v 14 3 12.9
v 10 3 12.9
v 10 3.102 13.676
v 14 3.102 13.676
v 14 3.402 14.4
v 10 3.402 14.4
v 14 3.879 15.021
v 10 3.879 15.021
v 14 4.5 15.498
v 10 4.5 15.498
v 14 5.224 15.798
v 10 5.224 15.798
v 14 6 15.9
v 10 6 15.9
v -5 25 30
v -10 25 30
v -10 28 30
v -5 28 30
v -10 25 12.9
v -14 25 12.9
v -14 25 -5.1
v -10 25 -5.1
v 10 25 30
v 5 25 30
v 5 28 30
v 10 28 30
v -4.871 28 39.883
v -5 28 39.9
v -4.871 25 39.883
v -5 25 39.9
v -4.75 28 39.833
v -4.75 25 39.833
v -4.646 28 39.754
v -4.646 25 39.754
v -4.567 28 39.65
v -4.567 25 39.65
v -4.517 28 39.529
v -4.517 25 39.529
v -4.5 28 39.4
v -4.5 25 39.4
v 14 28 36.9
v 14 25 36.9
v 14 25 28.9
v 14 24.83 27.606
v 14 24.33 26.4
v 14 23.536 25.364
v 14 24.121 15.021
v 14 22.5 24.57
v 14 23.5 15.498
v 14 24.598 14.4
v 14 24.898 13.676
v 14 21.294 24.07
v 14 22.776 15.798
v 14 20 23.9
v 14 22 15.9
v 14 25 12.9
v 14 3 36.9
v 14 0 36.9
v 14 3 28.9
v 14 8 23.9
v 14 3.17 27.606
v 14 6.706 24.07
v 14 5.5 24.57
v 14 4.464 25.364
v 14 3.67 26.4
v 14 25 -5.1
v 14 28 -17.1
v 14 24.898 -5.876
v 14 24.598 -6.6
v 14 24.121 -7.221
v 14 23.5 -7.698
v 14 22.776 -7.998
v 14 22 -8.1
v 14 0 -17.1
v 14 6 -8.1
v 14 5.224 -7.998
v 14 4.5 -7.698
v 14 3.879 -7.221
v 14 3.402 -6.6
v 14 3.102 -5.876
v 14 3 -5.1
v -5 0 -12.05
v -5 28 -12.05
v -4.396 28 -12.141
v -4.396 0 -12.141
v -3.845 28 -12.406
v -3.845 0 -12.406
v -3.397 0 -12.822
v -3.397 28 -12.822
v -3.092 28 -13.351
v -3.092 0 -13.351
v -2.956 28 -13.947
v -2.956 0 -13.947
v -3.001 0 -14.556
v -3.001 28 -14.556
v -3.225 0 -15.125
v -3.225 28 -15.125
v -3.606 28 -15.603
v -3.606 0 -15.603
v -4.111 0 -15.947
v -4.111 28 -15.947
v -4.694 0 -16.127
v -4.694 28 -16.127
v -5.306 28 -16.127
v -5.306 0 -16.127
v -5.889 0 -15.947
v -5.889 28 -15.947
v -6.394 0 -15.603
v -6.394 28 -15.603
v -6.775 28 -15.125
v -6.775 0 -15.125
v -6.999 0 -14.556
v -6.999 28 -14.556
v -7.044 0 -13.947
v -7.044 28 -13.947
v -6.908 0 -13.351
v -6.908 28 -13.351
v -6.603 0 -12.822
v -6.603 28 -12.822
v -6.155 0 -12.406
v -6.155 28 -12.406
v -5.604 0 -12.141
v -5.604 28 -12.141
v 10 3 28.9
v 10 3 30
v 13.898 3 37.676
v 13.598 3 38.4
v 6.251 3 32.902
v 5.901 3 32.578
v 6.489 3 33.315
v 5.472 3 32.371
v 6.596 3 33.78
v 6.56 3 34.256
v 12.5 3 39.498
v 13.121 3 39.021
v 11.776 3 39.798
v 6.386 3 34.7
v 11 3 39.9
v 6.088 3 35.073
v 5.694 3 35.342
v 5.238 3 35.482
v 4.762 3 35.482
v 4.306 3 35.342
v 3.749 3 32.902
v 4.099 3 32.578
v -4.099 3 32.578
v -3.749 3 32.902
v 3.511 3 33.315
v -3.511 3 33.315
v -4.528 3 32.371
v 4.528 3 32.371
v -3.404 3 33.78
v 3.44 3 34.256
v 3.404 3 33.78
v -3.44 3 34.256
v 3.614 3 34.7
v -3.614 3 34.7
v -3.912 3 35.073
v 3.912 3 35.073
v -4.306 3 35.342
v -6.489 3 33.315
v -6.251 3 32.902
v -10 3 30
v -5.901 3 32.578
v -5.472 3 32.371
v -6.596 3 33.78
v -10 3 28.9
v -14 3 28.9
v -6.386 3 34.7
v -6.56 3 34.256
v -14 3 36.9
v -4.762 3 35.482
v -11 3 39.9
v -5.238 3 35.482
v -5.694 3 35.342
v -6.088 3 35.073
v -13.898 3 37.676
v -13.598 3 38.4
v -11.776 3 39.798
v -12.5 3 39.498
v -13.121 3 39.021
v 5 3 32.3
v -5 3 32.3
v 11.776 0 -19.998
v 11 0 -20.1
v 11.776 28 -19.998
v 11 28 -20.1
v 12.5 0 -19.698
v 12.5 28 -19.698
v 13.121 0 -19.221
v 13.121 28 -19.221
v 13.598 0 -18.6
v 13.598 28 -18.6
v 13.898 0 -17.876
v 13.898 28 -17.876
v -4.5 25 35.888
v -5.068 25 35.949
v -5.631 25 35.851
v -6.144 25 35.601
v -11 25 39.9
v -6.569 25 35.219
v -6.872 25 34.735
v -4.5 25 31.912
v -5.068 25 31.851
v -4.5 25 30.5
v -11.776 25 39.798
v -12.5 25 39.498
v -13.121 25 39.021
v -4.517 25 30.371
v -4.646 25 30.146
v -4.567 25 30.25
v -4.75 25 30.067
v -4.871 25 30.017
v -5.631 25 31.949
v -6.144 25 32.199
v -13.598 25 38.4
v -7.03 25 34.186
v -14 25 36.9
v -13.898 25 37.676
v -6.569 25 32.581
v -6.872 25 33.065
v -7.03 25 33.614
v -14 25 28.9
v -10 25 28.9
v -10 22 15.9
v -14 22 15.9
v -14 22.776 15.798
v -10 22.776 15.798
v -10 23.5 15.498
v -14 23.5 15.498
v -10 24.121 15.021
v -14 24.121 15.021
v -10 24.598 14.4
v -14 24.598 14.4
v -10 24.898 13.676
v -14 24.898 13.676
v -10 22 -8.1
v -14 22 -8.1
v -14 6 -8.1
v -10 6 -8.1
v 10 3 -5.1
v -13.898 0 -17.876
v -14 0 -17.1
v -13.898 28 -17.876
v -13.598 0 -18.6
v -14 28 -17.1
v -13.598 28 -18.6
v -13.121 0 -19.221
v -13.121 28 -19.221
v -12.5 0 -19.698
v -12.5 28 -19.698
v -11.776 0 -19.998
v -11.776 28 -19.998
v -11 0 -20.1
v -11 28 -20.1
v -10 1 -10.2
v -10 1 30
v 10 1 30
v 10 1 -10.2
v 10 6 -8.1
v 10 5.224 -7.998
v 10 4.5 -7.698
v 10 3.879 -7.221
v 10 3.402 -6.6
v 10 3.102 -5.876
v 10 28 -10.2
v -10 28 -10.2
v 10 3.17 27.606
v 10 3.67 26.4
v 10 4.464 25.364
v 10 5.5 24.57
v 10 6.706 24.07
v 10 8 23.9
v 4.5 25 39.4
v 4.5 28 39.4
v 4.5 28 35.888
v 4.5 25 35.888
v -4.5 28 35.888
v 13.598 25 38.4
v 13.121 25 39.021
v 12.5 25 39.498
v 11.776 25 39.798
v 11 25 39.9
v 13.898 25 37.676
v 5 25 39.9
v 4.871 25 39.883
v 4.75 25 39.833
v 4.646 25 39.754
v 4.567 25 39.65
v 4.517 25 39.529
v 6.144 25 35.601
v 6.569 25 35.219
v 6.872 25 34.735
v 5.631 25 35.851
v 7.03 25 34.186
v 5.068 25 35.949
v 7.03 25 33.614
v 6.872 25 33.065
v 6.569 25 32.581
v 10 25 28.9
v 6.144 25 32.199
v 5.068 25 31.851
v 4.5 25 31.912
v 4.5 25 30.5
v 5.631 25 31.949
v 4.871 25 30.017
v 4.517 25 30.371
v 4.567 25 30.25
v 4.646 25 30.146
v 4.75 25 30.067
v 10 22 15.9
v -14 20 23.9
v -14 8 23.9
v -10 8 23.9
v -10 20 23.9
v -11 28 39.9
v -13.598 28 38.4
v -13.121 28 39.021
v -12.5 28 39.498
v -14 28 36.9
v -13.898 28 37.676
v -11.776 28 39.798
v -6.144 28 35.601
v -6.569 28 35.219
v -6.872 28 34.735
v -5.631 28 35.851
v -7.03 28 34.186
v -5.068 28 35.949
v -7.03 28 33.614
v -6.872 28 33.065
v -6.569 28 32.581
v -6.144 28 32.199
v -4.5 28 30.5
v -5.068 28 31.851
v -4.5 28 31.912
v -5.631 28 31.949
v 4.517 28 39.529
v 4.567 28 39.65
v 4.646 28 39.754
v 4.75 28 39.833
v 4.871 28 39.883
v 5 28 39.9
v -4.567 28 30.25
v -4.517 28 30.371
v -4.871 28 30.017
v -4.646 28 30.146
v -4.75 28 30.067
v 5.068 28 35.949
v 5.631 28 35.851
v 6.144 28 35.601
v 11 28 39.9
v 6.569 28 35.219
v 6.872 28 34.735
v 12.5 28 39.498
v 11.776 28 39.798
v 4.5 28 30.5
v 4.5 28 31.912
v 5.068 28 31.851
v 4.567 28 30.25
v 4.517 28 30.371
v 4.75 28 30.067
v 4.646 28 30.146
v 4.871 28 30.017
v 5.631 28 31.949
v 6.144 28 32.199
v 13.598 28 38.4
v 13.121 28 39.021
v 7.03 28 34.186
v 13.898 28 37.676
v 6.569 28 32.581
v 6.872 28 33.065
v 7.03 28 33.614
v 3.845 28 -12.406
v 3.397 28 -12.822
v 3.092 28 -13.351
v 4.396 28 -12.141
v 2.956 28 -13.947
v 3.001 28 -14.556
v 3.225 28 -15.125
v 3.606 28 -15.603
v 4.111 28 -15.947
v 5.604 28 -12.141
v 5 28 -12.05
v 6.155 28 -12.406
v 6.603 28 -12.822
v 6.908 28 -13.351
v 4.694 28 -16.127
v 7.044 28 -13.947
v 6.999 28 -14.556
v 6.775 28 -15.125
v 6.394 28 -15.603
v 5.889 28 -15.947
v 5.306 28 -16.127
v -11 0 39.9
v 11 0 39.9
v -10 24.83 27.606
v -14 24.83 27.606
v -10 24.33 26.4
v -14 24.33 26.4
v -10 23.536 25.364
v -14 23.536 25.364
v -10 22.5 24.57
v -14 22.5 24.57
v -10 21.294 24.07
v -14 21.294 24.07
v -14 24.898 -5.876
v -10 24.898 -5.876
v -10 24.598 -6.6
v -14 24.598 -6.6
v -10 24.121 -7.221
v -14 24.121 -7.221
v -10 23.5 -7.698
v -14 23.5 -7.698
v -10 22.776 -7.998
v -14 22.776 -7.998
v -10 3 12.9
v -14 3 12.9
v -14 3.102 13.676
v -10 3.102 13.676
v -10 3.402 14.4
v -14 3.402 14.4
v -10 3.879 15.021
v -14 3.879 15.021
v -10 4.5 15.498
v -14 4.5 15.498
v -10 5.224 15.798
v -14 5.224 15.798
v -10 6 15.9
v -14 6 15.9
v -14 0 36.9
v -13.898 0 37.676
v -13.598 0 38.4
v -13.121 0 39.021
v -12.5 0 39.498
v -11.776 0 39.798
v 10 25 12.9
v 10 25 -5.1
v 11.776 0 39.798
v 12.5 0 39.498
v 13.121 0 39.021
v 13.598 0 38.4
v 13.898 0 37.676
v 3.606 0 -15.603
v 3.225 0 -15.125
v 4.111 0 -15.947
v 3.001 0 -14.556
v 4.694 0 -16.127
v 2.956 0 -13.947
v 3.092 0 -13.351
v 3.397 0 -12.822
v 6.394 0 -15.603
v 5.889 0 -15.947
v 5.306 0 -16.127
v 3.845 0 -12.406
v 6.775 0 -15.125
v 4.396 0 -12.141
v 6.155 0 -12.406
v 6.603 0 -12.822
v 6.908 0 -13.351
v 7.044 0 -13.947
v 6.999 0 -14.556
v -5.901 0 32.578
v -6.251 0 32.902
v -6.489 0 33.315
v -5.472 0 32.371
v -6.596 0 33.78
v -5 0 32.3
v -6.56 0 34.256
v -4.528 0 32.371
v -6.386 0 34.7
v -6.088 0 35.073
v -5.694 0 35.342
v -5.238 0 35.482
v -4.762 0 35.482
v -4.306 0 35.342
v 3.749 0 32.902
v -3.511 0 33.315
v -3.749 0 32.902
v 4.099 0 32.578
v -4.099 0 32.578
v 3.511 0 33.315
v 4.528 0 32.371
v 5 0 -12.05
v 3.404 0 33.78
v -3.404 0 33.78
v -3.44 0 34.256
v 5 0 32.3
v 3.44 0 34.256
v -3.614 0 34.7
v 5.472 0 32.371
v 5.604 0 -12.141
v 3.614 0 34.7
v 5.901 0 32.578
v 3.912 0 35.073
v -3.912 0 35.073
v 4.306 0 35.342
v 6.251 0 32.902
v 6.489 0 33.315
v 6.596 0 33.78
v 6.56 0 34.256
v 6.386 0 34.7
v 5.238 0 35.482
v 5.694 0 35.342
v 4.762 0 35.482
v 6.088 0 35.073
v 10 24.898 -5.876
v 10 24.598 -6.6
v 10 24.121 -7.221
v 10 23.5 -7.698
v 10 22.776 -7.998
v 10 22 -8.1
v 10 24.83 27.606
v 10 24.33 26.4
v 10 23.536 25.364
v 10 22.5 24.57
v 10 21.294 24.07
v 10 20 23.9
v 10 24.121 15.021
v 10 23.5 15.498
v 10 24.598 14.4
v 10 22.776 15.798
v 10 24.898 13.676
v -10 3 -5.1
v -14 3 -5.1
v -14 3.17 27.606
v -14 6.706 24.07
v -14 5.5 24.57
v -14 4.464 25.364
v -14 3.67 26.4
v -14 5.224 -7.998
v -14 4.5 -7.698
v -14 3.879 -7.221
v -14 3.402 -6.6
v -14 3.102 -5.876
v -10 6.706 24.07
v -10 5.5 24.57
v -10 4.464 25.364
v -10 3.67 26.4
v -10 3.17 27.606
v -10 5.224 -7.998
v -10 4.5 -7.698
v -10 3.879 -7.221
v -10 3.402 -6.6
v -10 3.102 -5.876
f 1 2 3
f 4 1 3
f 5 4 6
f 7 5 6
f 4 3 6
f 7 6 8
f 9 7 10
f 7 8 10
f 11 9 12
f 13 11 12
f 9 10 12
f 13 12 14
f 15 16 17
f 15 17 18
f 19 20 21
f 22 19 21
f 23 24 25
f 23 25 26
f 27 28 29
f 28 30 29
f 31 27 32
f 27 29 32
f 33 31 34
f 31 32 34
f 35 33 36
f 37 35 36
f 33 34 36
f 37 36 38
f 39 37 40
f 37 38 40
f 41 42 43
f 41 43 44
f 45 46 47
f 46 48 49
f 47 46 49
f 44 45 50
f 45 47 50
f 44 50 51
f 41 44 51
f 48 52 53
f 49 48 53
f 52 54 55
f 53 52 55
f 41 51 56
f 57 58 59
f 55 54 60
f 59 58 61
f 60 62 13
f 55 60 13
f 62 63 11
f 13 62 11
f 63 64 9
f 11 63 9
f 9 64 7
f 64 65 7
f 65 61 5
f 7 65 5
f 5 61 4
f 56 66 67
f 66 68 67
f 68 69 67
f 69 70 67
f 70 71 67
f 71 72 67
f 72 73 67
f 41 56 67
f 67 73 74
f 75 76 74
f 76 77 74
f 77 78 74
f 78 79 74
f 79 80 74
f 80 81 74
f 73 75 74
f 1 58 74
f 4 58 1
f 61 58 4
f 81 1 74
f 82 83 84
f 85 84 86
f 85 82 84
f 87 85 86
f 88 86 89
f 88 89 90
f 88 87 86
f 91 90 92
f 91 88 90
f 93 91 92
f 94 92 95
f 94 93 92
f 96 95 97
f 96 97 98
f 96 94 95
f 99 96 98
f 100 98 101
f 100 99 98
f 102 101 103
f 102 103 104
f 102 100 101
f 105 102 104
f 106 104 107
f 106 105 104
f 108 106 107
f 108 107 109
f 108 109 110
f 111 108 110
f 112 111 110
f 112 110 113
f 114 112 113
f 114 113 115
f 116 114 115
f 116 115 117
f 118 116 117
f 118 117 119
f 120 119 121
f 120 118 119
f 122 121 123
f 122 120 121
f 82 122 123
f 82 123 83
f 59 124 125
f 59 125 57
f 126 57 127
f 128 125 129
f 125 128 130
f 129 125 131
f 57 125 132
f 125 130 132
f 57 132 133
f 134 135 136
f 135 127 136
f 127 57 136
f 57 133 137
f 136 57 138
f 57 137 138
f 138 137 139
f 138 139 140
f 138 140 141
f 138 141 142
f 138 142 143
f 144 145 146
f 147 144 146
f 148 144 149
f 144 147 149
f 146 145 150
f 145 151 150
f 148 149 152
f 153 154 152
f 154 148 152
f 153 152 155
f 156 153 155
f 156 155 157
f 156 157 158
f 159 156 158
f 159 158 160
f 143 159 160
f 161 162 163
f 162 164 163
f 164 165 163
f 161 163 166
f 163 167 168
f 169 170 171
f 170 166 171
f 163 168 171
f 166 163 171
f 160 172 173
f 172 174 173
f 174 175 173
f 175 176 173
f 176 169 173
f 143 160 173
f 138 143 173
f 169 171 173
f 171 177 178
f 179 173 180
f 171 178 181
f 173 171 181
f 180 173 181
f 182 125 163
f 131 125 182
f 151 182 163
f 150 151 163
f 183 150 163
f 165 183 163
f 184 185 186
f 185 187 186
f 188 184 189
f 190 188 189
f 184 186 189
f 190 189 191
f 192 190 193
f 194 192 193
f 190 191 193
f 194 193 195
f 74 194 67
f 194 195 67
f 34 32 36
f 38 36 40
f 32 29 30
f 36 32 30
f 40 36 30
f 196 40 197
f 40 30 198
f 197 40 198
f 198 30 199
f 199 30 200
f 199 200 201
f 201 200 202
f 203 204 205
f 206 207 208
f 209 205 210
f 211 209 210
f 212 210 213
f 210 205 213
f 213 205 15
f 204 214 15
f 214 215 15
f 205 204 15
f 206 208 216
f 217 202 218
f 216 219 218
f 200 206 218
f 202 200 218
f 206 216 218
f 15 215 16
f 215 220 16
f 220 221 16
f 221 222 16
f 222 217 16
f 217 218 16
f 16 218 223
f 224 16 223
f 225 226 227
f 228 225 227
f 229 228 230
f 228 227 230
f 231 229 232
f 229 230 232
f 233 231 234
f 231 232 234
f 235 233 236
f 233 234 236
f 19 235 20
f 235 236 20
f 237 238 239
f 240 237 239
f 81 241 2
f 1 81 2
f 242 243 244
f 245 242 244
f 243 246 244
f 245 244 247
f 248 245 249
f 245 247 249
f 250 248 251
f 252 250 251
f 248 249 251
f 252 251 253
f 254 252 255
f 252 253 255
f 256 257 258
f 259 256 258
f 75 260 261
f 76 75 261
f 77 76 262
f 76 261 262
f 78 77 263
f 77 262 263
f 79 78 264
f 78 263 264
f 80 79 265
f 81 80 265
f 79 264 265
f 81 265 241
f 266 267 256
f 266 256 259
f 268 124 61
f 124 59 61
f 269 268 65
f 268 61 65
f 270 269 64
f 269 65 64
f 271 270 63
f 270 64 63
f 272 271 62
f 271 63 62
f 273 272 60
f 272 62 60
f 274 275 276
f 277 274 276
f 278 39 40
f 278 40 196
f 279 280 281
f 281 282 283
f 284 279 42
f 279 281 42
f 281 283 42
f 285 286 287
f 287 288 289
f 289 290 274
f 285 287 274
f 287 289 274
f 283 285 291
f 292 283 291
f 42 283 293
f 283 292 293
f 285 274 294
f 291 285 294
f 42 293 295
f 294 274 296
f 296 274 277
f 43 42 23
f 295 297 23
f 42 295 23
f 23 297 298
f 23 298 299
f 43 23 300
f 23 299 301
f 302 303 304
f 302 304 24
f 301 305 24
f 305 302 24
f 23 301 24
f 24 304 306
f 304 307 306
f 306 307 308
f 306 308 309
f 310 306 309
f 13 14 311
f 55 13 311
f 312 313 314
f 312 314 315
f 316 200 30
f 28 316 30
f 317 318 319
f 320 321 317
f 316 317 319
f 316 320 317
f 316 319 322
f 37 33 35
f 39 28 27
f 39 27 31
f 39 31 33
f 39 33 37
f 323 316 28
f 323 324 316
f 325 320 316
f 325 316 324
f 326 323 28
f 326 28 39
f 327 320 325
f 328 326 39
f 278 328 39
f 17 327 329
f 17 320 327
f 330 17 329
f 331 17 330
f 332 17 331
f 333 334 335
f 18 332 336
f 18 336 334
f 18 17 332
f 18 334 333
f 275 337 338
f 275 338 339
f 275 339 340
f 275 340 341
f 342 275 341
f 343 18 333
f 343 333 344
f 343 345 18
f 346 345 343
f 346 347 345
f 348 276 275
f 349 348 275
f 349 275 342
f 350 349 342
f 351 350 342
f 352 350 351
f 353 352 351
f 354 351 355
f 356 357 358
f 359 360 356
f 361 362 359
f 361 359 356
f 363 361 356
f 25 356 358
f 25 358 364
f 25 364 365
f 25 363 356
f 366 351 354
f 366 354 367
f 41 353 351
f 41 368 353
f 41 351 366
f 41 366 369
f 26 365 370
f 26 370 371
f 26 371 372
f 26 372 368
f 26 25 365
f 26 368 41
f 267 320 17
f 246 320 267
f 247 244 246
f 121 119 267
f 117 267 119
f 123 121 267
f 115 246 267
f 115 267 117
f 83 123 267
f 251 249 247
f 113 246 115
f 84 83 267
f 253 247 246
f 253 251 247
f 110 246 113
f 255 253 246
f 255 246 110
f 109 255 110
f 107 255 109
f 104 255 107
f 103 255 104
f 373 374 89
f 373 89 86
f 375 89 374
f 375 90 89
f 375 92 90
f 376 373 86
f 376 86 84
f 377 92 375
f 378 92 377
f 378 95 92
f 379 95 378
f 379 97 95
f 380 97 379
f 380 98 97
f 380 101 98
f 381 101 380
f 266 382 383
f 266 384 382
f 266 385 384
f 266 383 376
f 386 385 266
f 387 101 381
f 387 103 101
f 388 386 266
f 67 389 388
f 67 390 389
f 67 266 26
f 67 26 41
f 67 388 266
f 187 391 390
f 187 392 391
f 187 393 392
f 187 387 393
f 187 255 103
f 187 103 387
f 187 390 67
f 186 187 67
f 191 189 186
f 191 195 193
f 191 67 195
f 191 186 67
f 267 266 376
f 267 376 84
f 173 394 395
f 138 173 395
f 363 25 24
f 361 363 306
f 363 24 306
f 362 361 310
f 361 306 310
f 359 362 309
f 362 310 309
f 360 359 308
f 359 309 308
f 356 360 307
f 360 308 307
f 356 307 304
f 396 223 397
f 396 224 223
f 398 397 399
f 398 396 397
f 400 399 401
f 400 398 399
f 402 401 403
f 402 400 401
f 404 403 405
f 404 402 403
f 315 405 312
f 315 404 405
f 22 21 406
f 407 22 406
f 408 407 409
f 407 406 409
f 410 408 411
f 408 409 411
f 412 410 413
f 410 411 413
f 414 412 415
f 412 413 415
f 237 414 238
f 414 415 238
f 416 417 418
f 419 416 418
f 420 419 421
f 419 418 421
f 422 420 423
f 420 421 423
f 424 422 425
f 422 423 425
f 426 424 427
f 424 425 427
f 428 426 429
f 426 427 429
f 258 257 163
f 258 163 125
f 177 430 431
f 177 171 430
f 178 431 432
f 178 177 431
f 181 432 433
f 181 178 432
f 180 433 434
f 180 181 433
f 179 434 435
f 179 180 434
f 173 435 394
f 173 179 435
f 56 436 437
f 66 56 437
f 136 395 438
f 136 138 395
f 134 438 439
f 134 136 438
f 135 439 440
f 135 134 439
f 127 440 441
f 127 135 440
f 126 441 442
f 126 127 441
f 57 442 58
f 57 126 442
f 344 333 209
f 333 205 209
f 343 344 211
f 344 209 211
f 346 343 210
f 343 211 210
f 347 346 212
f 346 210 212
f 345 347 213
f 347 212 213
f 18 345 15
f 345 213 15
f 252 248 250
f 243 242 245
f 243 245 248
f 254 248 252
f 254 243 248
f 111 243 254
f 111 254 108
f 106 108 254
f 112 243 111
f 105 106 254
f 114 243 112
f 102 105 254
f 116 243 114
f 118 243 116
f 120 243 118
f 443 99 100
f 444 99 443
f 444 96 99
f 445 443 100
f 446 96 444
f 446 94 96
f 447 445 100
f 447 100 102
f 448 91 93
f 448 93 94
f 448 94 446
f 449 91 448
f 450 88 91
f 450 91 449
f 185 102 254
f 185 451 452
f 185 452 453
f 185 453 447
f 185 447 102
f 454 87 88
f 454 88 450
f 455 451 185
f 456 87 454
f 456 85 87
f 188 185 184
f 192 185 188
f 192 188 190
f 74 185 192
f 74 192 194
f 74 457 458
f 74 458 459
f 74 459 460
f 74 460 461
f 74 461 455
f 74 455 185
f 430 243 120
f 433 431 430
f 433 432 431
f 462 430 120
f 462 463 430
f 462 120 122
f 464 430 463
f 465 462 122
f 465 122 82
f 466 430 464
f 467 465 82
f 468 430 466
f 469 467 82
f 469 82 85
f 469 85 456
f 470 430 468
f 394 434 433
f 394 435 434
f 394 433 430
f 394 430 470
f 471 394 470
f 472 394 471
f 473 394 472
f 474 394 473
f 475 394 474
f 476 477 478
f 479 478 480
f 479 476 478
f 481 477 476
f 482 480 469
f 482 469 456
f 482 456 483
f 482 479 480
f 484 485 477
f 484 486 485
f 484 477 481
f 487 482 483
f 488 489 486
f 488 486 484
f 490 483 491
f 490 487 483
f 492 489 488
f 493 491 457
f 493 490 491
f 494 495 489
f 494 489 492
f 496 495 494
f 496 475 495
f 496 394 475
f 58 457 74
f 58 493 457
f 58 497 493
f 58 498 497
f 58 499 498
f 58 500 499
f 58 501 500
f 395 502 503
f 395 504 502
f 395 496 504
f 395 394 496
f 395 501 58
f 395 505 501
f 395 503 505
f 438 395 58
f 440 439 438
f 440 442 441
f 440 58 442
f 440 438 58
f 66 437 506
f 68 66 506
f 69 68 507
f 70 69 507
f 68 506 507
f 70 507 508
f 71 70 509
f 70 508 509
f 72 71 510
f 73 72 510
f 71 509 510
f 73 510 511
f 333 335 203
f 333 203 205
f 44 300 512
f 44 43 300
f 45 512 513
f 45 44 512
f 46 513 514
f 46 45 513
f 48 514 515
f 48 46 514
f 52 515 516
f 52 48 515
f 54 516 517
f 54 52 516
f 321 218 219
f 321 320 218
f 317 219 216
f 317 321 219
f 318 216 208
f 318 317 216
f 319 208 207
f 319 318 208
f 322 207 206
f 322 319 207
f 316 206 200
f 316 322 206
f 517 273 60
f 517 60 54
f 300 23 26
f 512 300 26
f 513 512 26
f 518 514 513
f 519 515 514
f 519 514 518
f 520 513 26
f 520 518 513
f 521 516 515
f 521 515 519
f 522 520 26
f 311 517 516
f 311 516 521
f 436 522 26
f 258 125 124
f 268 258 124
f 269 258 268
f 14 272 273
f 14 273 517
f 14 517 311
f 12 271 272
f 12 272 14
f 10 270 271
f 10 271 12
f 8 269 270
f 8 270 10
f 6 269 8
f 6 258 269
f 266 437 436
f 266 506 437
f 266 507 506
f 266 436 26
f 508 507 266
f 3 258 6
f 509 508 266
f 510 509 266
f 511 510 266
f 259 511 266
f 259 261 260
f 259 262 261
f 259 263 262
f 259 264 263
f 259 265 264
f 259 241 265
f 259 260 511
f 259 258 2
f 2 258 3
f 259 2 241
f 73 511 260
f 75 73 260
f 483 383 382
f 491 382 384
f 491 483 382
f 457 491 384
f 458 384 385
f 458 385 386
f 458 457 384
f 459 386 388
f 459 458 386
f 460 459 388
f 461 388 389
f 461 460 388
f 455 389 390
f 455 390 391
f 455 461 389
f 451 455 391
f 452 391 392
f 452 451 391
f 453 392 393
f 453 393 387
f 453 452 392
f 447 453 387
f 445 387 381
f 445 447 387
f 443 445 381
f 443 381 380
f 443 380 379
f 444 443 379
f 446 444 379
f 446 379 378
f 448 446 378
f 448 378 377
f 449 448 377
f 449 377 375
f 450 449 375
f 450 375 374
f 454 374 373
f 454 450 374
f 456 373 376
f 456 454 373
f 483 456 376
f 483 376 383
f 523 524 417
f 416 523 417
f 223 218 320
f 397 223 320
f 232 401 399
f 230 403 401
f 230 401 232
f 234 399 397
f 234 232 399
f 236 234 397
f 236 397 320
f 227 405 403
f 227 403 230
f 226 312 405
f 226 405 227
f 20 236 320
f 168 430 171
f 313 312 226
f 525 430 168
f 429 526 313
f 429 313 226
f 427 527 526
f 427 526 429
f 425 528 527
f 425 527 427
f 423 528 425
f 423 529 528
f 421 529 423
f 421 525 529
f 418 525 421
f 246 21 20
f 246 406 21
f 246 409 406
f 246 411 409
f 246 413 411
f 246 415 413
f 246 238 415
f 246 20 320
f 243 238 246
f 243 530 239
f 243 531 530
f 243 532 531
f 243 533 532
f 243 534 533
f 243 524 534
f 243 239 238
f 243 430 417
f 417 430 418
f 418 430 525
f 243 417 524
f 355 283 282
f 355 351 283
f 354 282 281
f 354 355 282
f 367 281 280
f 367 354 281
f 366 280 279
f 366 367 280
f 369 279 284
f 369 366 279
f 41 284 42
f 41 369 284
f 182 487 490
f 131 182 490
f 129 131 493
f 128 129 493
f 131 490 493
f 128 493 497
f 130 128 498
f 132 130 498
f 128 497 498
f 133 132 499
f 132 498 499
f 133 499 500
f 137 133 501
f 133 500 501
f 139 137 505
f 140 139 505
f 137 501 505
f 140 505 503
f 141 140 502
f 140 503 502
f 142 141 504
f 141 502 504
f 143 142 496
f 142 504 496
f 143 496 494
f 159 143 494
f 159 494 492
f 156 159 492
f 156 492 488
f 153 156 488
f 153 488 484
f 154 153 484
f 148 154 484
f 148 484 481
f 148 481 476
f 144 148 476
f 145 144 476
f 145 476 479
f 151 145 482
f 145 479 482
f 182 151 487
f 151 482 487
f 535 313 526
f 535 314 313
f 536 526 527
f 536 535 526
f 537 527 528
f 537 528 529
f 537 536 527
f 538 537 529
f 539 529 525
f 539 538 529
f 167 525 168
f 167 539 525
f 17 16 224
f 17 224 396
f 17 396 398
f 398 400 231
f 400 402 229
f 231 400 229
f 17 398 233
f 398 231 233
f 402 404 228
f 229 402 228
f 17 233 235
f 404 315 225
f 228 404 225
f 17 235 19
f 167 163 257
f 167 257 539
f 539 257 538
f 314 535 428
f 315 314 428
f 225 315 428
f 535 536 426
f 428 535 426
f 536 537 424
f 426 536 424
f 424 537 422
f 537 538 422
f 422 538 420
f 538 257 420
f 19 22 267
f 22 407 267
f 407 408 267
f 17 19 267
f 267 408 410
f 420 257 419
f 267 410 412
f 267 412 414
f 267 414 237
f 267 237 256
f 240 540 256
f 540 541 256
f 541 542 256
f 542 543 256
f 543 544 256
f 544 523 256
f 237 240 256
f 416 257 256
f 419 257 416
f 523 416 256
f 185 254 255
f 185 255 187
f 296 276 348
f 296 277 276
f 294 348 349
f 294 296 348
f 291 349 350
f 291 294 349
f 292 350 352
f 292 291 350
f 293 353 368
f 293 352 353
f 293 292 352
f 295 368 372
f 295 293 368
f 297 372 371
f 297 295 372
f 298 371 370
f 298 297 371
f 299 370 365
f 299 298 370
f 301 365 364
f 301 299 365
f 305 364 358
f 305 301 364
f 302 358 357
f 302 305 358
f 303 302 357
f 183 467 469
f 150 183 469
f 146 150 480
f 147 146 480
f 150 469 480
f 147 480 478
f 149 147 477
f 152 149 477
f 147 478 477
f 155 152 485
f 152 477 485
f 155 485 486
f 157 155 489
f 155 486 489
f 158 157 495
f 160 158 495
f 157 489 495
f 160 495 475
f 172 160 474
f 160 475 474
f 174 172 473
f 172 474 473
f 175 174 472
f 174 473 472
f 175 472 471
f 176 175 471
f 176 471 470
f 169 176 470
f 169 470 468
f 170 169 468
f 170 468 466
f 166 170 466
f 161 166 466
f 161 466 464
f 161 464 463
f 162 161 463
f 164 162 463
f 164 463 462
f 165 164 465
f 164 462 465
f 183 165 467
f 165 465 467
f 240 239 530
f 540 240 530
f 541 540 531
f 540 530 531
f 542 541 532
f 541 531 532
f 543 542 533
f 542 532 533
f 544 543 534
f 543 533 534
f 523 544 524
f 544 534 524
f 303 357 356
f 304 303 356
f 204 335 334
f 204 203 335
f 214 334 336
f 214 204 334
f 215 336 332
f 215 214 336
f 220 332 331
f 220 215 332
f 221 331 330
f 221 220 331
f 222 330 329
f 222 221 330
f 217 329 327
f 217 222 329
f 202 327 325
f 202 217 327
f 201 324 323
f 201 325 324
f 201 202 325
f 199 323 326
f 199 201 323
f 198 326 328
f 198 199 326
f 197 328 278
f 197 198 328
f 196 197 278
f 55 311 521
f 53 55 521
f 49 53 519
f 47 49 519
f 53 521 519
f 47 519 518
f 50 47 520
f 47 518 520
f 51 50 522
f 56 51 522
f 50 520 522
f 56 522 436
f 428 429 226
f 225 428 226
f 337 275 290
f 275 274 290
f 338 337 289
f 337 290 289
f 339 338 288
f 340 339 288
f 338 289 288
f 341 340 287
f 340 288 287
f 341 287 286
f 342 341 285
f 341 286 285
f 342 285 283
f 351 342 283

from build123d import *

# Parameters (mm, degrees)
SKETCH_1_W                      = 28
SKETCH_1_H                      = 60
SKETCH_1_R                      = 2.05
SKETCH_1_W_2                    = 20
SKETCH_1_H_2                    = 40.2
EXTRUDE_1_DEPTH                 = 28
CUT_EXTRUDE_3_DEPTH             = 51.714987923
CUT_EXTRUDE_3_DEPTH_BACK        = 51.714987923
SKETCH_4_W                      = 16
SKETCH_4_H                      = 22
FILLET_3_R                      = 5
FILLET_1_R                      = 3
SKETCH_6_R                      = 2.05
SKETCH_6_R_2                    = 1.6
EXTRUDE_3_DEPTH                 = 3
CUT_EXTRUDE_4_REACH             = 52.715
SKETCH_7_W                      = 9
SKETCH_7_H                      = 9.9
CUT_EXTRUDE_4_DIRECTION_2_DEPTH = 51.714987923
SKETCH_9_W                      = 20
SKETCH_9_H                      = 40.2
EXTRUDE_4_DEPTH                 = 1
FILLET_4_R                      = 0.5


with BuildPart() as part:
    # 草图1 → 凸台-拉伸1 (new body)
    with BuildSketch(Plane(origin=(0, 0, 0), x_dir=(1, 0, 0), z_dir=(0, 1, 0))):
        with Locations((0, -9.9)):
            Rectangle(SKETCH_1_W, SKETCH_1_H)
        with Locations(Location((-5, 14.1, 0), (0, 0, 270))):
            Circle(SKETCH_1_R, mode=Mode.SUBTRACT)
        with Locations(Location((5, 14.1, 0), (0, 0, 270))):
            Circle(SKETCH_1_R, mode=Mode.SUBTRACT)
        with Locations(Location((-5, -33.9, 0), (0, 0, 270))):
            Circle(SKETCH_1_R, mode=Mode.SUBTRACT)
        with Locations(Location((5, -33.9, 0), (0, 0, 270))):
            Circle(SKETCH_1_R, mode=Mode.SUBTRACT)
        with Locations((0, -9.9)):
            Rectangle(SKETCH_1_W_2, SKETCH_1_H_2, mode=Mode.SUBTRACT)
    extrude(amount=EXTRUDE_1_DEPTH)

    # 草图4 → 切除-拉伸3 (cut, two sides: drawn at the far end of the back side and taken through both)
    with BuildSketch(Plane(origin=(0, 0, 0), x_dir=(0, 0, -1), z_dir=(1, 0, 0)).offset(-CUT_EXTRUDE_3_DEPTH_BACK)):
        with Locations((-31.9, 14)):
            Rectangle(SKETCH_4_W, SKETCH_4_H)
        with BuildLine():
            Line((-12.9, 25), (5.1, 25))
            ThreePointArc((5.1, 25), (7.221320344, 24.121320344), (8.1, 22))
            Line((8.1, 22), (8.1, 6))
            ThreePointArc((8.1, 6), (7.221320344, 3.878679656), (5.1, 3))
            Line((5.1, 3), (-12.9, 3))
            ThreePointArc((-12.9, 3), (-15.021320344, 3.878679656), (-15.9, 6))
            Line((-15.9, 6), (-15.9, 22))
            ThreePointArc((-15.9, 22), (-15.021320344, 24.121320344), (-12.9, 25))
        make_face()
    extrude(amount=CUT_EXTRUDE_3_DEPTH + CUT_EXTRUDE_3_DEPTH_BACK, mode=Mode.SUBTRACT)

    # 圆角3
    fillet_3_edges = [part.edges().sort_by_distance(p)[0] for p in [
        (-12, 25, 23.9),
        (12, 25, 23.9),
        (12, 3, 23.9),
        (-12, 3, 23.9),
    ]]
    fillet(fillet_3_edges, radius=FILLET_3_R)

    # 圆角1
    fillet_1_edges = [part.edges().sort_by_distance(p)[0] for p in [
        (14, 1.5, 39.9),
        (-14, 1.5, 39.9),
        (14, 26.5, 39.9),
        (-14, 26.5, 39.9),
        (-14, 14, -20.1),
        (14, 14, -20.1),
    ]]
    fillet(fillet_1_edges, radius=FILLET_1_R)

    # 草图6 → 凸台-拉伸3 (add)
    # profile 1 of 2: a face of its own
    with BuildSketch(Plane.XZ):
        with Locations(Location((-5, 33.9, 0), (0, 0, 90))):
            Circle(SKETCH_6_R)
        with Locations(Location((-5, 33.9, 0), (0, 0, 270))):
            Circle(SKETCH_6_R_2, mode=Mode.SUBTRACT)
    # profile 2 of 2: a face of its own
    with BuildSketch(Plane.XZ):
        with Locations(Location((5, 33.9, 0), (0, 0, 90))):
            Circle(SKETCH_6_R)
        with Locations(Location((5, 33.9, 0), (0, 0, 270))):
            Circle(SKETCH_6_R_2, mode=Mode.SUBTRACT)
    extrude(amount=-EXTRUDE_3_DEPTH)

    # 草图7 → 切除-拉伸4 (cut, up to next)
    with BuildSketch(Plane(origin=(0, 28, 0), x_dir=(1, 0, 0), z_dir=(0, 1, 0)), mode=Mode.PRIVATE) as cut_extrude_4_sk1:
        with Locations((0, -34.95)):
            Rectangle(SKETCH_7_W, SKETCH_7_H)
    cut_extrude_4_tool1 = extrude(cut_extrude_4_sk1.sketch, amount=-CUT_EXTRUDE_4_REACH, mode=Mode.PRIVATE) & part.part
    add(cut_extrude_4_tool1.solids().sort_by_distance((0, 28, 34.95))[0], mode=Mode.SUBTRACT)

    # 草图7 → 切除-拉伸4 direction 2 (cut)
    with BuildSketch(Plane(origin=(0, 28, 0), x_dir=(1, 0, 0), z_dir=(0, 1, 0))):
        with Locations((0, -34.95)):
            Rectangle(SKETCH_7_W, SKETCH_7_H)
    extrude(amount=CUT_EXTRUDE_4_DIRECTION_2_DEPTH, mode=Mode.SUBTRACT)

    # 草图9 → 凸台-拉伸4 (add)
    with BuildSketch(Plane.XZ):
        with Locations((0, 9.9)):
            Rectangle(SKETCH_9_W, SKETCH_9_H)
    extrude(amount=-EXTRUDE_4_DEPTH)

    # 圆角4
    fillet_4_edges = [part.edges().sort_by_distance(p)[0] for p in [
        (-4.5, 26.5, 30),
        (-4.5, 26.5, 39.9),
        (4.5, 26.5, 39.9),
        (4.5, 26.5, 30),
    ]]
    fillet(fillet_4_edges, radius=FILLET_4_R)


solid = part.part
